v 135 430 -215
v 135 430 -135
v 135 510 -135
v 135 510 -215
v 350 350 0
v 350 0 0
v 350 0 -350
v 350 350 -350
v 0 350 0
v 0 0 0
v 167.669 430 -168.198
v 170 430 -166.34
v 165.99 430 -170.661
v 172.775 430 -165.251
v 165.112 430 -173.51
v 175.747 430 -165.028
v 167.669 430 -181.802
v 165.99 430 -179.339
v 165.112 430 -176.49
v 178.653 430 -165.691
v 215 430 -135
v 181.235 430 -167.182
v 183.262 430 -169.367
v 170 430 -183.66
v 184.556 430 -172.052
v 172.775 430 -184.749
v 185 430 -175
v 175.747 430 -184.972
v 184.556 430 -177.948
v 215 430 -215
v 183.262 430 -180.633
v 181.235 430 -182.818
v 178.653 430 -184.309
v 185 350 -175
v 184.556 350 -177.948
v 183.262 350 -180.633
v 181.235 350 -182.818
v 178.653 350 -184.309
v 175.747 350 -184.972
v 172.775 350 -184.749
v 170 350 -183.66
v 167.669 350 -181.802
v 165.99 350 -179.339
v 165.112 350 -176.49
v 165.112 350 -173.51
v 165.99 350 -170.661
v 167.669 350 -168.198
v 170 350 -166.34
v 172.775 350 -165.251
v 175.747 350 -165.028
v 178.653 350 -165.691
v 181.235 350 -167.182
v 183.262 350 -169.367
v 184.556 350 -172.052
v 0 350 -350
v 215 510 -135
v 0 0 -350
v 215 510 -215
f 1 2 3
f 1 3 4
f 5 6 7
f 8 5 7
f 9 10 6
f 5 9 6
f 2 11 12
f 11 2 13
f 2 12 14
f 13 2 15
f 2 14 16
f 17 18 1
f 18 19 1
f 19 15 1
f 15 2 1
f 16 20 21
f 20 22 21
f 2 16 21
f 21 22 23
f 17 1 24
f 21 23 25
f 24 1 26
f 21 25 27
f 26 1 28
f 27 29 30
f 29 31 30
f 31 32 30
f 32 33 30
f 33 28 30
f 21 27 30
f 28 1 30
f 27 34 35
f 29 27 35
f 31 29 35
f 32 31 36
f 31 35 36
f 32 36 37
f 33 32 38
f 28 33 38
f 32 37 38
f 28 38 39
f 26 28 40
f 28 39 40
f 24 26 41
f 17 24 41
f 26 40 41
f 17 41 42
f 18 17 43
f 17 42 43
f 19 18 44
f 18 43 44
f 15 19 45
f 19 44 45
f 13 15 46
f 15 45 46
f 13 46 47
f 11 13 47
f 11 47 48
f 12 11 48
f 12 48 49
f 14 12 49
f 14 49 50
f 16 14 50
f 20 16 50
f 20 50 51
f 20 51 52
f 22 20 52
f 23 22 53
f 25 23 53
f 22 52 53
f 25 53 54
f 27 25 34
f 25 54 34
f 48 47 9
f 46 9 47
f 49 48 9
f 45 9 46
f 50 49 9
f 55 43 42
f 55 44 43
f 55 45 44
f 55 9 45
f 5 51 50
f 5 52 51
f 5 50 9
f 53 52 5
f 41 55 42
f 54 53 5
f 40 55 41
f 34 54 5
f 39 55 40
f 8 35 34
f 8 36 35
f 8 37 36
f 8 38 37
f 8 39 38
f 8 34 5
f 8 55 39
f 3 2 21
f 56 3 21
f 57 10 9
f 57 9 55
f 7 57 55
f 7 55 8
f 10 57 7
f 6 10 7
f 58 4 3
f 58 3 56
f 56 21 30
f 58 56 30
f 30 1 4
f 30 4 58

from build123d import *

# Parameters (mm, degrees)
ESQUISSE1_W      = 350
ESQUISSE1_H      = 350
EXTRUSION1_DEPTH = 350
ESQUISSE2_R      = 10
EXTRUSION2_DEPTH = 80
ESQUISSE3_W      = 80
ESQUISSE3_H      = 80
EXTRUSION3_DEPTH = 80


with BuildPart() as part:
    # Esquisse1 → Extrusion1 (new body)
    with BuildSketch(Plane(origin=(0, 0, 0), x_dir=(1, 0, 0), z_dir=(0, 1, 0))):
        with Locations((175, 175)):
            Rectangle(ESQUISSE1_W, ESQUISSE1_H)
    extrude(amount=EXTRUSION1_DEPTH)

    # Esquisse2 → Extrusion2 (add)
    with BuildSketch(Plane(origin=(0, 350, 0), x_dir=(1, 0, 0), z_dir=(0, 1, 0))):
        with Locations((175, 175)):
            Circle(ESQUISSE2_R)
    extrude(amount=EXTRUSION2_DEPTH)

    # Esquisse3 → Extrusion3 (add)
    with BuildSketch(Plane(origin=(0, 430, 0), x_dir=(1, 0, 0), z_dir=(0, 1, 0))):
        with Locations((175, 175)):
            Rectangle(ESQUISSE3_W, ESQUISSE3_H)
    extrude(amount=EXTRUSION3_DEPTH)


solid = part.part
